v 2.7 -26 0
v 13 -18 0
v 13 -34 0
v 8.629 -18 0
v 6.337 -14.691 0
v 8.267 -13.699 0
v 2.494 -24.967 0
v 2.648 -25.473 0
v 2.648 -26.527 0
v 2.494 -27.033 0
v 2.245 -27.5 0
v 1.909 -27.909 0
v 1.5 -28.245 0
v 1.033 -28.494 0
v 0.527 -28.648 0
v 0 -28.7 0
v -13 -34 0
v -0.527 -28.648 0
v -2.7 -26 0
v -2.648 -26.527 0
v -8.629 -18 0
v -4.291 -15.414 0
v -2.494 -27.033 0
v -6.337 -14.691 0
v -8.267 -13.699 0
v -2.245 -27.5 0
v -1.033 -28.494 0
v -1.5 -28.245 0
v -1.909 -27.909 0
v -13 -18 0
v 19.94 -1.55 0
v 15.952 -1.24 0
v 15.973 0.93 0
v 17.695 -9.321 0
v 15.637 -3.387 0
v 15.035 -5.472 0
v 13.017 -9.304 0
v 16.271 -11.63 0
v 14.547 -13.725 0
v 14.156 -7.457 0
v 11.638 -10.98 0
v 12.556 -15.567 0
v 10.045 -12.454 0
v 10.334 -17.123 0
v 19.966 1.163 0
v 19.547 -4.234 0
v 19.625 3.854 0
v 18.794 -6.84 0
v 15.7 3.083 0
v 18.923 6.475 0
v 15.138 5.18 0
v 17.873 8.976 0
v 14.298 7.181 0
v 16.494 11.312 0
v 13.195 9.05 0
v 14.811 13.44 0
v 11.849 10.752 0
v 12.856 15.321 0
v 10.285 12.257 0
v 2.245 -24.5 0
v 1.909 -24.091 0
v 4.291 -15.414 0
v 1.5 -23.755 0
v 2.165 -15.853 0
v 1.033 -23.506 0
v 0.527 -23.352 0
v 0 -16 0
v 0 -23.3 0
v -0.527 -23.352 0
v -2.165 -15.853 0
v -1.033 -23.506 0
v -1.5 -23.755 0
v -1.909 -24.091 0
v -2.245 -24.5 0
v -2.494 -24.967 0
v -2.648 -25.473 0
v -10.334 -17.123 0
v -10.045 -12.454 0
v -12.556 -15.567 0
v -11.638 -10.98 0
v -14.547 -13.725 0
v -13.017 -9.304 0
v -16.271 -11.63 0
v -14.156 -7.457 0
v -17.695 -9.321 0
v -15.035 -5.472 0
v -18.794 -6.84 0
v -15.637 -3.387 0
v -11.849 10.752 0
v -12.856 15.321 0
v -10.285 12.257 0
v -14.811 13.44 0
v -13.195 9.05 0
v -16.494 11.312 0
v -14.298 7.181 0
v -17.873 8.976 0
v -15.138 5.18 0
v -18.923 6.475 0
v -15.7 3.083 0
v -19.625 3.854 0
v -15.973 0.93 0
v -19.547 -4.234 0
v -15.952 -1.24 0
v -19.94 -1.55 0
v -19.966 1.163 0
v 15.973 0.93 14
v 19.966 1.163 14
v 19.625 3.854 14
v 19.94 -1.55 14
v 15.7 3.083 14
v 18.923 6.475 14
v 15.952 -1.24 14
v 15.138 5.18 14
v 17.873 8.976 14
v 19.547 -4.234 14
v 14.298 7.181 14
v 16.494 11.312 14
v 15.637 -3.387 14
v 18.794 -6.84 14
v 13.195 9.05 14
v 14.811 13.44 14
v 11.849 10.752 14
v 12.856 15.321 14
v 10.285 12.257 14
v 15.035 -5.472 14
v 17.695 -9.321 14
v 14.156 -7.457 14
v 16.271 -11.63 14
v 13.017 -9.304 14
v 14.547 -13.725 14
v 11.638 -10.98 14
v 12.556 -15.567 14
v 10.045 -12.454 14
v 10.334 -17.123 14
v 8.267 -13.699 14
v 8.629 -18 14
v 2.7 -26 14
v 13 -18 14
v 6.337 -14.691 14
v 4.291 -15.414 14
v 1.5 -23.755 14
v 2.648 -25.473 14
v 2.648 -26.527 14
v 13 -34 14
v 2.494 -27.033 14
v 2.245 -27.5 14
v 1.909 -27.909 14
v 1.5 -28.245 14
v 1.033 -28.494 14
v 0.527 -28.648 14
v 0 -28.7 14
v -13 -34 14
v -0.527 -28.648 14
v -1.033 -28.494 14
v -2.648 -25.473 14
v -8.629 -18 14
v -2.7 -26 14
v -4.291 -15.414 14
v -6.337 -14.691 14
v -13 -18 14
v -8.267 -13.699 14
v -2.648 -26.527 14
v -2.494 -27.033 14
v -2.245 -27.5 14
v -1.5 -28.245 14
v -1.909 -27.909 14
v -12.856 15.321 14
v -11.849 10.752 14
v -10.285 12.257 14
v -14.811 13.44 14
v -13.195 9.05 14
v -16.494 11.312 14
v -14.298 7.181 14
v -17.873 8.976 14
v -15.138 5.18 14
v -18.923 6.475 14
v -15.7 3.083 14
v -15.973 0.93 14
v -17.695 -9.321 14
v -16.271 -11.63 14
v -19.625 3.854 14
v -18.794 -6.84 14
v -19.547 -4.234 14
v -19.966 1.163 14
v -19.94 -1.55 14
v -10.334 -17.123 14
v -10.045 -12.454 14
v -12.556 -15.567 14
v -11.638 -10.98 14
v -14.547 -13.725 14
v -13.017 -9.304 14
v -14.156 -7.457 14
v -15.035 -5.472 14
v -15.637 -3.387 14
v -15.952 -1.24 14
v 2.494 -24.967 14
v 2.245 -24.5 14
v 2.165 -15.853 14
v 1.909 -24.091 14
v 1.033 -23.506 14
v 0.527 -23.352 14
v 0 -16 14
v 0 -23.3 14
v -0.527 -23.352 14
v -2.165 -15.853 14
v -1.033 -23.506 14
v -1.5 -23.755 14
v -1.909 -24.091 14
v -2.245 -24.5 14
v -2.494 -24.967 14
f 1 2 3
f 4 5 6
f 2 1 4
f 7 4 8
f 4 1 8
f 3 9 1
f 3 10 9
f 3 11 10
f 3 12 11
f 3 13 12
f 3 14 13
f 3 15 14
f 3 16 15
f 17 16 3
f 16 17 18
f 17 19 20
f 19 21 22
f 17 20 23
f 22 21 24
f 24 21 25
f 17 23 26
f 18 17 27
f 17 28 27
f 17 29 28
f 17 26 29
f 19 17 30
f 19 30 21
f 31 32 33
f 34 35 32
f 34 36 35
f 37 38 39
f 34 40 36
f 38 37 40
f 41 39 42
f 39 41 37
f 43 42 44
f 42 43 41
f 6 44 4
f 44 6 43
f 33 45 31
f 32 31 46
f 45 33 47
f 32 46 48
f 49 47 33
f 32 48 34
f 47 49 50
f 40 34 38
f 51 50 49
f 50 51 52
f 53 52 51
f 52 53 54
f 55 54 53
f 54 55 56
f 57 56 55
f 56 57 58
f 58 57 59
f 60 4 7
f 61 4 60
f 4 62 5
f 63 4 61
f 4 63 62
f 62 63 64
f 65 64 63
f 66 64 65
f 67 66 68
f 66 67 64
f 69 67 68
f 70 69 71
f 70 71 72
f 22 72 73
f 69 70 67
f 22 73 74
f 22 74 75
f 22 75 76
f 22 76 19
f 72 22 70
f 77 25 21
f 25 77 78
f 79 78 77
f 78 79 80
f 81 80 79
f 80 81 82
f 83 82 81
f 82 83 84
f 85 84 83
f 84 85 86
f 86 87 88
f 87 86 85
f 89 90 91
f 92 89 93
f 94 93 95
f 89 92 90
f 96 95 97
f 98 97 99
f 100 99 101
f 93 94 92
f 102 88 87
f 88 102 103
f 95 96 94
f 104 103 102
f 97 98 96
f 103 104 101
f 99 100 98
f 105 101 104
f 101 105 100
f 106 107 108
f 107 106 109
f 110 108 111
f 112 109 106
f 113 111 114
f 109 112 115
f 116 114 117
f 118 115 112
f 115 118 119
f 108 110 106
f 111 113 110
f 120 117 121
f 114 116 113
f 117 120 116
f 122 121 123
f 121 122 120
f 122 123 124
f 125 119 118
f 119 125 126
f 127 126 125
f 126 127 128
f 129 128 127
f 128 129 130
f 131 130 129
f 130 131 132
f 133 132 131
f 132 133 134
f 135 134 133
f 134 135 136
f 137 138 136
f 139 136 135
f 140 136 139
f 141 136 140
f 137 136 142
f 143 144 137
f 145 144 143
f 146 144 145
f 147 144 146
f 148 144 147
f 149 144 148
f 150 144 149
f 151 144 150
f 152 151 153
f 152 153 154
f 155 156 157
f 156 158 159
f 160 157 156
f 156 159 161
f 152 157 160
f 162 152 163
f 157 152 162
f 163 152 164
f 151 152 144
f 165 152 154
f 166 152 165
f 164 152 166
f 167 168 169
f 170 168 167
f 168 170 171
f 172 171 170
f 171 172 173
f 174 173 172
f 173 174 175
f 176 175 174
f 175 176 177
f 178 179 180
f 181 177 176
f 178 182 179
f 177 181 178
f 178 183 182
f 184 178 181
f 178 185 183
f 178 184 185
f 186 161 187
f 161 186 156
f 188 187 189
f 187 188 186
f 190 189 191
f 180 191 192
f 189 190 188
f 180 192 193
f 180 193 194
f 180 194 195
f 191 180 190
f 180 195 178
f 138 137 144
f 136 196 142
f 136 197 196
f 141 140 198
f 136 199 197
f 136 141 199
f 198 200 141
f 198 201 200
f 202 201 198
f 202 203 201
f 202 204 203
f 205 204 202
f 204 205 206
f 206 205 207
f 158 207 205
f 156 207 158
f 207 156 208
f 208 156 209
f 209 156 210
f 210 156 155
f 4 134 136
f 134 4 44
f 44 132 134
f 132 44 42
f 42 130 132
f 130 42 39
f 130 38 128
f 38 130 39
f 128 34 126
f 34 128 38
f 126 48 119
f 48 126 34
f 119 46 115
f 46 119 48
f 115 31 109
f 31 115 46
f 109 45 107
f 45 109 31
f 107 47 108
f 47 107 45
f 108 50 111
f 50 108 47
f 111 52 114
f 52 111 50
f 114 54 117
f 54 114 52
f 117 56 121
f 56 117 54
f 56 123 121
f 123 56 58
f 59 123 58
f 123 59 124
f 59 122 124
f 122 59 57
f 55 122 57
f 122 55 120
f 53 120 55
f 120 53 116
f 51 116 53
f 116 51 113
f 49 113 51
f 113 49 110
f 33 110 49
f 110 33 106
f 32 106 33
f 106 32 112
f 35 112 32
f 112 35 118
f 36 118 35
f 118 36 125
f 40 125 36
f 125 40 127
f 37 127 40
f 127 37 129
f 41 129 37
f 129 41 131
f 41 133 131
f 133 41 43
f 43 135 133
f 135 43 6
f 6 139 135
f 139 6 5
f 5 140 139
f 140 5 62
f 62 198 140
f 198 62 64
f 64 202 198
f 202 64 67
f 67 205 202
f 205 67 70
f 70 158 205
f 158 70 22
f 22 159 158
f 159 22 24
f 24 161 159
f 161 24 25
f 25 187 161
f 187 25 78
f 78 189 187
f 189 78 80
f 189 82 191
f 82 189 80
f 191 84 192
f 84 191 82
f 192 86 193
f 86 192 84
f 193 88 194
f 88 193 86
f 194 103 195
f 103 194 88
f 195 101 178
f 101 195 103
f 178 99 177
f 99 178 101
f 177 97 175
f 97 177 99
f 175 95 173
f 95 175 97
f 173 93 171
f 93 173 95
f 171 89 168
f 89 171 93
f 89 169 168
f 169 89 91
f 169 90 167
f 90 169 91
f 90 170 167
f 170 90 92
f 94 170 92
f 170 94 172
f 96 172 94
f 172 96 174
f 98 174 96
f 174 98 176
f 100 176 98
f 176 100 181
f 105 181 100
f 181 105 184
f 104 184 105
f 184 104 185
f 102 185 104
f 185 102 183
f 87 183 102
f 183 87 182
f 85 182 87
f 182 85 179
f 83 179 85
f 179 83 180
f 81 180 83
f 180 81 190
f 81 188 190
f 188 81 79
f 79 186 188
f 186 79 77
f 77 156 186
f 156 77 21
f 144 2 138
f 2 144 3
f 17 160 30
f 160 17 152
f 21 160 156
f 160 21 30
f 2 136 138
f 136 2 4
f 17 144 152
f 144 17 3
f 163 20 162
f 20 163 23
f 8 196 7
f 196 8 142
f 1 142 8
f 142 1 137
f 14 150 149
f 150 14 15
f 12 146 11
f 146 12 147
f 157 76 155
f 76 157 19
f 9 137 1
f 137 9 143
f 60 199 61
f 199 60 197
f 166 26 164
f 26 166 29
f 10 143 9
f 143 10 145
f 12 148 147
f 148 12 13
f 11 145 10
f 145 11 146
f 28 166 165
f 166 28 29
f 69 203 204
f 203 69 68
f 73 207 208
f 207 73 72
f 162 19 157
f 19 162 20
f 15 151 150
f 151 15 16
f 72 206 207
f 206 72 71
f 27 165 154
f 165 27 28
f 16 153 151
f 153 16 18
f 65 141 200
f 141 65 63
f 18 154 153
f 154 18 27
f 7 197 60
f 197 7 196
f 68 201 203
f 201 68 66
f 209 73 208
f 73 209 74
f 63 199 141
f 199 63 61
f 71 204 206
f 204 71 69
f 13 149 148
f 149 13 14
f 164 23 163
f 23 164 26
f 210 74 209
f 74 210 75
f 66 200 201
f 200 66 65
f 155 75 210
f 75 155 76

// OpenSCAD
$fn = 32;

// ----------------------------------------------------------------------
// Spring clip: 40 mm outside, 4 mm band, 80 degree opening
// ----------------------------------------------------------------------

// --- parameters (mm) ---
outer_r = 20;             // clip outside radius
inner_r = 16;             // clip bore radius
band = 4;                 // band thickness
clip_w = 14;              // clip width
opening = 80;             // opening angle
tab_w = 26;               // tab width
tab_len = 14;             // tab length past the clip
tab_hole = 5.4;           // tab fixing hole

clip_profile = [[-12.856, 15.321], [-14.811, 13.44], [-16.494, 11.312], [-17.873, 8.976], [-18.923, 6.475], [-19.625, 3.854], [-19.966, 1.163], [-19.94, -1.55], [-19.547, -4.234], [-18.794, -6.84], [-17.695, -9.321], [-16.271, -11.63], [-14.547, -13.725], [-12.556, -15.567], [-10.334, -17.123], [-7.922, -18.364], [-5.363, -19.267], [-2.707, -19.816], [0, -20], [2.707, -19.816], [5.363, -19.267], [7.922, -18.364], [10.334, -17.123], [12.556, -15.567], [14.547, -13.725], [16.271, -11.63], [17.695, -9.321], [18.794, -6.84], [19.547, -4.234], [19.94, -1.55], [19.966, 1.163], [19.625, 3.854], [18.923, 6.475], [17.873, 8.976], [16.494, 11.312], [14.811, 13.44], [12.856, 15.321], [10.285, 12.257], [11.849, 10.752], [13.195, 9.05], [14.298, 7.181], [15.138, 5.18], [15.7, 3.083], [15.973, 0.93], [15.952, -1.24], [15.637, -3.387], [15.035, -5.472], [14.156, -7.457], [13.017, -9.304], [11.638, -10.98], [10.045, -12.454], [8.267, -13.699], [6.337, -14.691], [4.291, -15.414], [2.165, -15.853], [0, -16], [-2.165, -15.853], [-4.291, -15.414], [-6.337, -14.691], [-8.267, -13.699], [-10.045, -12.454], [-11.638, -10.98], [-13.017, -9.304], [-14.156, -7.457], [-15.035, -5.472], [-15.637, -3.387], [-15.952, -1.24], [-15.973, 0.93], [-15.7, 3.083], [-15.138, 5.18], [-14.298, 7.181], [-13.195, 9.05], [-11.849, 10.752], [-10.285, 12.257]];

difference() {
  union() {
    linear_extrude(height = clip_w) polygon(clip_profile);
    /* mounting tab, sunk 2 mm into the band */
    translate([-13, -34, 0]) cube([tab_w, 16, clip_w]);
  }
  translate([0, -26, -2.5]) cylinder(h = clip_w + 5, d = tab_hole);
}
